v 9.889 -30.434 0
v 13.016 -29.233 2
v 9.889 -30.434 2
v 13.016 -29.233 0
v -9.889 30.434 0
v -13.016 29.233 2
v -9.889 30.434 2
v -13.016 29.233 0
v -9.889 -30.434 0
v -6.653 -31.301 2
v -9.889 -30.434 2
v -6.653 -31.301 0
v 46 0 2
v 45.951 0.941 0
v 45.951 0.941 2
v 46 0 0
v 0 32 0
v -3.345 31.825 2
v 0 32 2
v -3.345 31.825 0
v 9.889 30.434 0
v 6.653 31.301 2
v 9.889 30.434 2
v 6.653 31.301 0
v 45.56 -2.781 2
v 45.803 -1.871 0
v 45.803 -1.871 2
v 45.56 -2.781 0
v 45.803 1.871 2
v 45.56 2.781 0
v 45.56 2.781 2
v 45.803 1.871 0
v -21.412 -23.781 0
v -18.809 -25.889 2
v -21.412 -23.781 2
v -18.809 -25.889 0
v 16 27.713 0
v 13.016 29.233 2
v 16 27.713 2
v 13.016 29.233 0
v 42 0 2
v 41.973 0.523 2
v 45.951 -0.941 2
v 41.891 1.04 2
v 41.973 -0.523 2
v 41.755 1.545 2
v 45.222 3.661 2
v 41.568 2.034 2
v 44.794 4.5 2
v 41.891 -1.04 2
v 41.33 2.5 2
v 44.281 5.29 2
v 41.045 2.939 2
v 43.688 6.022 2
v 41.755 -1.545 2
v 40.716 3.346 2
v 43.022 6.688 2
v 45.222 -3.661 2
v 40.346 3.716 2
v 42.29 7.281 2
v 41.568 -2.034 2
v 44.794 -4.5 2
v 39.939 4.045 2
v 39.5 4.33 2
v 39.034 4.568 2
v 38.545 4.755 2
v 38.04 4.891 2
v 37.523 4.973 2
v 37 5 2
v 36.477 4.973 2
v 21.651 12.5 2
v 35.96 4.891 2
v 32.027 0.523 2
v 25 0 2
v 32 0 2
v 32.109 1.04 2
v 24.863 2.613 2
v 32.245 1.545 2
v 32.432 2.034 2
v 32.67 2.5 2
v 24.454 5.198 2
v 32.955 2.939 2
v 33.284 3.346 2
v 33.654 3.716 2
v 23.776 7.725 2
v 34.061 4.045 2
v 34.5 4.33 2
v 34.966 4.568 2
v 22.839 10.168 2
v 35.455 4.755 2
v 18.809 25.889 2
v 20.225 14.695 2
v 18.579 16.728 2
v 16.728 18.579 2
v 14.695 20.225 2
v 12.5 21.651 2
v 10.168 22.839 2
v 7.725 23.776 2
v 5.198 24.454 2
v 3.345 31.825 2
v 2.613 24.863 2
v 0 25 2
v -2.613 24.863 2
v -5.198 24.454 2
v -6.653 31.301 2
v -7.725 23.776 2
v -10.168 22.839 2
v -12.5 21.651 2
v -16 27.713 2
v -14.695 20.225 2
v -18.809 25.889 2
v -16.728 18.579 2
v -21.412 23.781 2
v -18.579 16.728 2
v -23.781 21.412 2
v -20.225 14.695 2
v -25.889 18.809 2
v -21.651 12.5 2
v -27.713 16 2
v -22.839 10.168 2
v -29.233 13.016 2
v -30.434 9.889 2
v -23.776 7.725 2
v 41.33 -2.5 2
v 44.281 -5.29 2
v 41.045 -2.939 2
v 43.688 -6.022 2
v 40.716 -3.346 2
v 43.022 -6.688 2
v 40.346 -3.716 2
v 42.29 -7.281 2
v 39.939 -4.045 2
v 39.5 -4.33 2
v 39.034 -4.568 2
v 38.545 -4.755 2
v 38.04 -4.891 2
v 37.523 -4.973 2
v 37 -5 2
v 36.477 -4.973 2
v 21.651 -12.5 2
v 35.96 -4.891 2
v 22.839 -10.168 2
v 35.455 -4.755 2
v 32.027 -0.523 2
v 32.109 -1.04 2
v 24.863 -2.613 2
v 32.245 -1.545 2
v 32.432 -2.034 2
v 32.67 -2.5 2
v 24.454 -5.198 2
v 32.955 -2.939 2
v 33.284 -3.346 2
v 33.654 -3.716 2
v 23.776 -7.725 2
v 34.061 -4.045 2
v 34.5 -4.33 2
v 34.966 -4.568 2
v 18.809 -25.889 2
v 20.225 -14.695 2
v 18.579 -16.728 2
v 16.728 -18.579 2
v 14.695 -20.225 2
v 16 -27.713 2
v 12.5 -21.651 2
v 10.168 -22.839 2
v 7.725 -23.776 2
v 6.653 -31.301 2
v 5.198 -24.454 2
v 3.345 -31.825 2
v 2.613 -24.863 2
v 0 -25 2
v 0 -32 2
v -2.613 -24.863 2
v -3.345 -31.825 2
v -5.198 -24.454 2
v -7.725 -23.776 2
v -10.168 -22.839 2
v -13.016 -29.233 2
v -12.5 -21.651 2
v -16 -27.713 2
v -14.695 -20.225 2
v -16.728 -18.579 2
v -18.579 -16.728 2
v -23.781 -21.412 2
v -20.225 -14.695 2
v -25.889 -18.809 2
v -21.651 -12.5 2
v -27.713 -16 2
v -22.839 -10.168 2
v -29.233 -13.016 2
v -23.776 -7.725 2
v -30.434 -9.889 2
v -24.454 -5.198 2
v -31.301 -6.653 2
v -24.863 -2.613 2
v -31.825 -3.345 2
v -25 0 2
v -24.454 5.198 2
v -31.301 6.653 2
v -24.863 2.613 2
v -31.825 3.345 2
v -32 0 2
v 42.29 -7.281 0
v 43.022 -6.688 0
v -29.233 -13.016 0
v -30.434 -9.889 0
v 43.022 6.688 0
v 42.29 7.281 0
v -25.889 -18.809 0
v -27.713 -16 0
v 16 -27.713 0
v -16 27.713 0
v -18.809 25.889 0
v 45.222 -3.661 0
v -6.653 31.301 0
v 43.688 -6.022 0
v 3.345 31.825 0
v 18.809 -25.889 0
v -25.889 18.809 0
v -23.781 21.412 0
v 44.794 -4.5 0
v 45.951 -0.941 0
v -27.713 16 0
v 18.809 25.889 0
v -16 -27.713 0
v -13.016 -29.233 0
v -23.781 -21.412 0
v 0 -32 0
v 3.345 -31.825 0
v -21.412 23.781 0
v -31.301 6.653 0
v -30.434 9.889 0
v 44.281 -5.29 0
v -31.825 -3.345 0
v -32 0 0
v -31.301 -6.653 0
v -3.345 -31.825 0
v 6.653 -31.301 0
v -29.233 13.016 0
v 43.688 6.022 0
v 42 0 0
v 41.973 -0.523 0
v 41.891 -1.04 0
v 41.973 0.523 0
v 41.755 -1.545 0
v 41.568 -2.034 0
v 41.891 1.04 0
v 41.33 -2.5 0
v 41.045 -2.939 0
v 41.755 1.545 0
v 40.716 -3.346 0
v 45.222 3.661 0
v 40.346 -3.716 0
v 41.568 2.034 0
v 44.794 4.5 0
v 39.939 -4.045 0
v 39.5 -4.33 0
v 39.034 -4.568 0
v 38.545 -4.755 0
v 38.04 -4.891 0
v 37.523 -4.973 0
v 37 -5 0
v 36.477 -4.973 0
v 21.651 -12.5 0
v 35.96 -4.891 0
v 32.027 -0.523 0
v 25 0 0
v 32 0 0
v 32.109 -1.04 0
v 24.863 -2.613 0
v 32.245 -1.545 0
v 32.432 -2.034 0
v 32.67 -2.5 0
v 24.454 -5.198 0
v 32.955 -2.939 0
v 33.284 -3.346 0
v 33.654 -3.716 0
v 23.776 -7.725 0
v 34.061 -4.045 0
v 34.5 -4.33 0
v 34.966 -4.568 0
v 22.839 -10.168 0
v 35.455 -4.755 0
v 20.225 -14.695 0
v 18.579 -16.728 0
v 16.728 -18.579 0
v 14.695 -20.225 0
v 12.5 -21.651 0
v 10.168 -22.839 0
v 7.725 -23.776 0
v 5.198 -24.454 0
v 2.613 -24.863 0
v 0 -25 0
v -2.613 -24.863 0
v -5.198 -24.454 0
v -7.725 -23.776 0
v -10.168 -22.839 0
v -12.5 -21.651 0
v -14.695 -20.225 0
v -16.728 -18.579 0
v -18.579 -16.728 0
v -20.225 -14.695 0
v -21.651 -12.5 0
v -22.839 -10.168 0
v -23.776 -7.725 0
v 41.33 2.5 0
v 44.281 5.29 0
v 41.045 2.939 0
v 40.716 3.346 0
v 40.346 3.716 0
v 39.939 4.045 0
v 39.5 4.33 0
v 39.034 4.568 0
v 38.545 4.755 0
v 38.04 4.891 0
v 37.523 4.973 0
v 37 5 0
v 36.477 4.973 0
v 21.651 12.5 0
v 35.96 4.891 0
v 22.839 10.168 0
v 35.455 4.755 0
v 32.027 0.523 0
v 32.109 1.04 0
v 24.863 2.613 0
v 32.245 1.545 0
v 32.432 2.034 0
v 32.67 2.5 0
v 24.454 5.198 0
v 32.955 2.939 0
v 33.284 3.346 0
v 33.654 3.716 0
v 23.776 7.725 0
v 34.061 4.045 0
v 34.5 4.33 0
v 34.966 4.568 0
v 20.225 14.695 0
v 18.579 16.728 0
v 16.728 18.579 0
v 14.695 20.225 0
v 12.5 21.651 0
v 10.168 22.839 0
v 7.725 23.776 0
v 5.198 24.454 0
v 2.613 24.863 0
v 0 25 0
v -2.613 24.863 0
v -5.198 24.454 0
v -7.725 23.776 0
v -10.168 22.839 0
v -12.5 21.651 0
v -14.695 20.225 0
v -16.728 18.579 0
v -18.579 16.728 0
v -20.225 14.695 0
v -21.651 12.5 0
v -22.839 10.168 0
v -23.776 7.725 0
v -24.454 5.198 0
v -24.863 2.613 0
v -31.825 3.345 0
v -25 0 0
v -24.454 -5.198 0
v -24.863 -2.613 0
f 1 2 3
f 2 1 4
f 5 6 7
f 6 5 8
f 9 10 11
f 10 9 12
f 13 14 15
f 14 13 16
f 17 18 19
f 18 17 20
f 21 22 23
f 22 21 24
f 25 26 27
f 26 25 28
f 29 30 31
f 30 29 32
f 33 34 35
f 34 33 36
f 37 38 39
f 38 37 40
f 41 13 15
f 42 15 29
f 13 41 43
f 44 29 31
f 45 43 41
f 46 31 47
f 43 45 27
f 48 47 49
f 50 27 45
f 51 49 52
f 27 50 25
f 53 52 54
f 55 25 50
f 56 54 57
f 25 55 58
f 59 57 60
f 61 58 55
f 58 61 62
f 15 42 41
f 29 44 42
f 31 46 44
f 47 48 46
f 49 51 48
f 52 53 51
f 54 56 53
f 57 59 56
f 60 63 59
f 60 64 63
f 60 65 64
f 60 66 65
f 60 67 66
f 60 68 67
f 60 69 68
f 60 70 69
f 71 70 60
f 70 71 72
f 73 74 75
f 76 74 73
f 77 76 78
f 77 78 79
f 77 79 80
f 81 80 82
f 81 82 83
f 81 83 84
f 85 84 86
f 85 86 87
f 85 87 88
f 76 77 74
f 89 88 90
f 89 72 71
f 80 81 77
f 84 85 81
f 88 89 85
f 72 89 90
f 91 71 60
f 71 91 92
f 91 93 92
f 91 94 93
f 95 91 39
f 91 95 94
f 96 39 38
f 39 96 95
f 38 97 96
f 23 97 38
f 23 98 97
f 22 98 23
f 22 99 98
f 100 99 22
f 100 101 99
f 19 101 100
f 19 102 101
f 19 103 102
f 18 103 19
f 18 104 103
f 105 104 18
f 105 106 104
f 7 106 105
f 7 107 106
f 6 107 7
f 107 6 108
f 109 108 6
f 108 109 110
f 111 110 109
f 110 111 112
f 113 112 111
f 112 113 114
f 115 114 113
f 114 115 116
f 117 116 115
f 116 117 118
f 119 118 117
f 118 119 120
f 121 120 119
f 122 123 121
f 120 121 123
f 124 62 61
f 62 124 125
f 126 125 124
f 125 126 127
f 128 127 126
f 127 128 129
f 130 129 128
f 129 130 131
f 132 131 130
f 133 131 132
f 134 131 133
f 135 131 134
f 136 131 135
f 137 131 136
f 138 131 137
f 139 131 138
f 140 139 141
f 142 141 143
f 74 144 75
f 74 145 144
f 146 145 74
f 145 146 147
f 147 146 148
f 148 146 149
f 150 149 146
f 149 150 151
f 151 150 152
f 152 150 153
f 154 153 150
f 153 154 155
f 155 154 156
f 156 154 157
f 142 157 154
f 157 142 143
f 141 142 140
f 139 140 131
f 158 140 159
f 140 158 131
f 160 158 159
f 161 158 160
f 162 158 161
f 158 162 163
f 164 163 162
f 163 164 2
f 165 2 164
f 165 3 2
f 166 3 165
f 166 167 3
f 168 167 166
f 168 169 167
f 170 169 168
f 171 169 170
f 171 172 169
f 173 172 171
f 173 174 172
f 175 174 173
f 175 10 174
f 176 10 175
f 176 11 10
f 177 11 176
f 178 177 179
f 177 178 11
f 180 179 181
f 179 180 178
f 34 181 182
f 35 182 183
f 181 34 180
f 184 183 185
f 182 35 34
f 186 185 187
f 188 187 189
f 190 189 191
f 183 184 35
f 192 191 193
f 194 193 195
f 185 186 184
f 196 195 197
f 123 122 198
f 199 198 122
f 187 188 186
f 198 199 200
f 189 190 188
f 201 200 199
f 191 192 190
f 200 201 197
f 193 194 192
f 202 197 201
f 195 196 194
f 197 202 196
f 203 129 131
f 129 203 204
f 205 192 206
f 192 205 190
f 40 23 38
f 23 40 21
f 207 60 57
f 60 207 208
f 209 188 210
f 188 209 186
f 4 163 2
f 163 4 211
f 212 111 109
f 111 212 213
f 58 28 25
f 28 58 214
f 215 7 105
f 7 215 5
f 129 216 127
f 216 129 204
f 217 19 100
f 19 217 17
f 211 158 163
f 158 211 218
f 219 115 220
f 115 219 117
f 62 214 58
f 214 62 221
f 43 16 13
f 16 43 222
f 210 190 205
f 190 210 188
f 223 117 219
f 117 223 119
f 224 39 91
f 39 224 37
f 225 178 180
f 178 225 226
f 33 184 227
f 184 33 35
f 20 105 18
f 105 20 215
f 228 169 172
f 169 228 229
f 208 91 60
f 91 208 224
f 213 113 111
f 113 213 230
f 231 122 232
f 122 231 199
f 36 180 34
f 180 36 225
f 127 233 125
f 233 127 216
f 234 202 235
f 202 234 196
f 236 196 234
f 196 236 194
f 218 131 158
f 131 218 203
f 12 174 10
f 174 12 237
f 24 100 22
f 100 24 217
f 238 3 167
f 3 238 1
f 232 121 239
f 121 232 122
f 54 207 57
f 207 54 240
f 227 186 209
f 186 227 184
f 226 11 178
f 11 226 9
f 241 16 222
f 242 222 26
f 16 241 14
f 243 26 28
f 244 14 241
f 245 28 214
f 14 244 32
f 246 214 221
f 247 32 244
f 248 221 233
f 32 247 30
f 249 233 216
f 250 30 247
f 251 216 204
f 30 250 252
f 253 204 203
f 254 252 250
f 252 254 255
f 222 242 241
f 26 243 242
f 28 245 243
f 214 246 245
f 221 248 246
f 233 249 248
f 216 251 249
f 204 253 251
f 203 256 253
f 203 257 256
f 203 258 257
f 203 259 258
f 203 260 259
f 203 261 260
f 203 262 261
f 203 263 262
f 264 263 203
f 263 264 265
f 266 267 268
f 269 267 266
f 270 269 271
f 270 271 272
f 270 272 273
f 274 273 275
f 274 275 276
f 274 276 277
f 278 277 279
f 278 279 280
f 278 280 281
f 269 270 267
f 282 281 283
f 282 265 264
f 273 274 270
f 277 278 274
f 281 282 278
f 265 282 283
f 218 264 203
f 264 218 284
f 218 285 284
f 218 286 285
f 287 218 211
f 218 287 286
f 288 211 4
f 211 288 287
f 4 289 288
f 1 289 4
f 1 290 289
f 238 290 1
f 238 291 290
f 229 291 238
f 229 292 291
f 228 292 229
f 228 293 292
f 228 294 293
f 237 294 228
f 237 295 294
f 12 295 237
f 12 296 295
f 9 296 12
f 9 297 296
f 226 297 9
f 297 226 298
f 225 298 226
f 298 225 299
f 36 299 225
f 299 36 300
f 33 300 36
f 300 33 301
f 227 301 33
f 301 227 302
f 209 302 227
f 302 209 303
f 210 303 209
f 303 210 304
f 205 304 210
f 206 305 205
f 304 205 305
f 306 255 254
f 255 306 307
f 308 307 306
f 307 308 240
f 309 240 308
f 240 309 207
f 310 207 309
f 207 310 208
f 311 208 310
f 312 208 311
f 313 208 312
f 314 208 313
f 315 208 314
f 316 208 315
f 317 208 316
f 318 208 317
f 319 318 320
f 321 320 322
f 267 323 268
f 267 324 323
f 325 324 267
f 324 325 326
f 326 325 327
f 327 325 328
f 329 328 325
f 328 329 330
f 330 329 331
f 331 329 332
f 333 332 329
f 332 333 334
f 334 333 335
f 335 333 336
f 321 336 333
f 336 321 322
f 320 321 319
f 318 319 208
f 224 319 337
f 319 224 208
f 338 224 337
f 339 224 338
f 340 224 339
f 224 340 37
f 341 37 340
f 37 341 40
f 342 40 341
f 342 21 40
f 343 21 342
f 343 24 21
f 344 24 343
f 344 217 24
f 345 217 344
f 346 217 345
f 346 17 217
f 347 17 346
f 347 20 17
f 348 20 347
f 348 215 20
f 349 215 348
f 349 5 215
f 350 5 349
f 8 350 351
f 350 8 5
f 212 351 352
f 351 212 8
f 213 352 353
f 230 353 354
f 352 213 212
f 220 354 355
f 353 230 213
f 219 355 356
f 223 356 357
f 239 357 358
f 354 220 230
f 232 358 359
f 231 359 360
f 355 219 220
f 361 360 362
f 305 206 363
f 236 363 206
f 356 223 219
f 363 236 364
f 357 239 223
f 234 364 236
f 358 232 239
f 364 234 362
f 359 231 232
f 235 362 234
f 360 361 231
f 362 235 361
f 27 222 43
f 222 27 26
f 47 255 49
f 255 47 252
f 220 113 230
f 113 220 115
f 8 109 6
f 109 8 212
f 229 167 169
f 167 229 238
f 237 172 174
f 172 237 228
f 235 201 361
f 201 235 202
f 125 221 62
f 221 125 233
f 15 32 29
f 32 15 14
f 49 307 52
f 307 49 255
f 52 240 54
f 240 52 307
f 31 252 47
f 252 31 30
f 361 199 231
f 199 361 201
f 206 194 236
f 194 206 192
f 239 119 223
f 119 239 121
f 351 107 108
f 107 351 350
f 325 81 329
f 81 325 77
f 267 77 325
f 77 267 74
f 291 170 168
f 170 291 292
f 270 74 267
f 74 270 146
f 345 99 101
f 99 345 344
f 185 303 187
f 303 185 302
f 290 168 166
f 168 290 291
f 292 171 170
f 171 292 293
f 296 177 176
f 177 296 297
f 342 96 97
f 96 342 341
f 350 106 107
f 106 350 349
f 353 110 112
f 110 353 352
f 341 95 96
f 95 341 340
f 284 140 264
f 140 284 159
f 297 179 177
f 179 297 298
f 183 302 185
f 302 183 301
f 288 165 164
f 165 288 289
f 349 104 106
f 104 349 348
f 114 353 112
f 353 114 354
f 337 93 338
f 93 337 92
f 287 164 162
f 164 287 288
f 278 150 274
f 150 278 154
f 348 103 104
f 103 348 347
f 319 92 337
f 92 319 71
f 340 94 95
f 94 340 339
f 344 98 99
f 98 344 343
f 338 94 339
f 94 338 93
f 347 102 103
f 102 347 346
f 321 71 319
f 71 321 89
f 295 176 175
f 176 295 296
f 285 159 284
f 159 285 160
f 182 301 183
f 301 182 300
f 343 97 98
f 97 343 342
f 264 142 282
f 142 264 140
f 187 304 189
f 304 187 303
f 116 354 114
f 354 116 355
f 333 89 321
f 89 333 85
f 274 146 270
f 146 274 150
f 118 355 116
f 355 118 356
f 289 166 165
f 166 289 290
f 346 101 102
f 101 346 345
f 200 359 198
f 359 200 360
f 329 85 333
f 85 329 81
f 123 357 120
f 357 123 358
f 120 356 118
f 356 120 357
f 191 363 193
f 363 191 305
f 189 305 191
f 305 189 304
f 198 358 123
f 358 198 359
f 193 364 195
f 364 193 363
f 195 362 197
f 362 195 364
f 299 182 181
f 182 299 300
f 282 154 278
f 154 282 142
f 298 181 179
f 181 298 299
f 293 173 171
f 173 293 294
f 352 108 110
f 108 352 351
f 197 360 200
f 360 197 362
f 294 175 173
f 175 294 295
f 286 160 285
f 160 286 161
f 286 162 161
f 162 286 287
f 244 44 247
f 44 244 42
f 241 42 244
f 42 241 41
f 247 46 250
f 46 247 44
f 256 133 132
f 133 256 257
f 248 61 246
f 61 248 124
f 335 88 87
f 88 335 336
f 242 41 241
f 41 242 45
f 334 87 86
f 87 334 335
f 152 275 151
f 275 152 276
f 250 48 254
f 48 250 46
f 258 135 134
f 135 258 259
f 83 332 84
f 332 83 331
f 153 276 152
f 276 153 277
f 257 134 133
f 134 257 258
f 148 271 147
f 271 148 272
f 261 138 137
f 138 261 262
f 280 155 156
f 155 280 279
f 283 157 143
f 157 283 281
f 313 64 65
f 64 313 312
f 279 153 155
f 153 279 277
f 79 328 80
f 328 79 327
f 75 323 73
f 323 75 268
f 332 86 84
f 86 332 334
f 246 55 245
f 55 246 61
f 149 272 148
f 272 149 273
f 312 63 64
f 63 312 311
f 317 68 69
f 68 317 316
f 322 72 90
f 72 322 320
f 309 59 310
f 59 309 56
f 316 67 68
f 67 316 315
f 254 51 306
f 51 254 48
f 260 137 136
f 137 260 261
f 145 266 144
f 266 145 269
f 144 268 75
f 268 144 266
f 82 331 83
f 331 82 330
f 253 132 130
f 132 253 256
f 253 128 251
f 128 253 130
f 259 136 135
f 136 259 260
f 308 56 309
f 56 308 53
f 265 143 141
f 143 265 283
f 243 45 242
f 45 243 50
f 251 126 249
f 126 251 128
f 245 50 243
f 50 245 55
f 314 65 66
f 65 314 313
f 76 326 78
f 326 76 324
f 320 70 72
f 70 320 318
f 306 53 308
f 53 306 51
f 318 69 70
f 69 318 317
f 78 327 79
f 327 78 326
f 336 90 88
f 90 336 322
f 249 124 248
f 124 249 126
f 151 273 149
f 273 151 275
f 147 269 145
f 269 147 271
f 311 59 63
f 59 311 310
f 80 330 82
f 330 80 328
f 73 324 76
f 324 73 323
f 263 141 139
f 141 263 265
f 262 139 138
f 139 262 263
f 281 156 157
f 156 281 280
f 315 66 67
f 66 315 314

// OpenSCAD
//Diameter of ring opening in mm
hole=50;

/* [Hidden] */
$fn=60;

difference() {
	hull() {
		cylinder(r=hole/2+7,h=2);
		translate([hole/2+7+5,0,0]) cylinder(r=9,h=2);
	}
	translate([0,0,-1])cylinder(r=hole/2,h=4);
	translate([hole/2+7+5,0,-1])cylinder(r=5,h=5);
}
